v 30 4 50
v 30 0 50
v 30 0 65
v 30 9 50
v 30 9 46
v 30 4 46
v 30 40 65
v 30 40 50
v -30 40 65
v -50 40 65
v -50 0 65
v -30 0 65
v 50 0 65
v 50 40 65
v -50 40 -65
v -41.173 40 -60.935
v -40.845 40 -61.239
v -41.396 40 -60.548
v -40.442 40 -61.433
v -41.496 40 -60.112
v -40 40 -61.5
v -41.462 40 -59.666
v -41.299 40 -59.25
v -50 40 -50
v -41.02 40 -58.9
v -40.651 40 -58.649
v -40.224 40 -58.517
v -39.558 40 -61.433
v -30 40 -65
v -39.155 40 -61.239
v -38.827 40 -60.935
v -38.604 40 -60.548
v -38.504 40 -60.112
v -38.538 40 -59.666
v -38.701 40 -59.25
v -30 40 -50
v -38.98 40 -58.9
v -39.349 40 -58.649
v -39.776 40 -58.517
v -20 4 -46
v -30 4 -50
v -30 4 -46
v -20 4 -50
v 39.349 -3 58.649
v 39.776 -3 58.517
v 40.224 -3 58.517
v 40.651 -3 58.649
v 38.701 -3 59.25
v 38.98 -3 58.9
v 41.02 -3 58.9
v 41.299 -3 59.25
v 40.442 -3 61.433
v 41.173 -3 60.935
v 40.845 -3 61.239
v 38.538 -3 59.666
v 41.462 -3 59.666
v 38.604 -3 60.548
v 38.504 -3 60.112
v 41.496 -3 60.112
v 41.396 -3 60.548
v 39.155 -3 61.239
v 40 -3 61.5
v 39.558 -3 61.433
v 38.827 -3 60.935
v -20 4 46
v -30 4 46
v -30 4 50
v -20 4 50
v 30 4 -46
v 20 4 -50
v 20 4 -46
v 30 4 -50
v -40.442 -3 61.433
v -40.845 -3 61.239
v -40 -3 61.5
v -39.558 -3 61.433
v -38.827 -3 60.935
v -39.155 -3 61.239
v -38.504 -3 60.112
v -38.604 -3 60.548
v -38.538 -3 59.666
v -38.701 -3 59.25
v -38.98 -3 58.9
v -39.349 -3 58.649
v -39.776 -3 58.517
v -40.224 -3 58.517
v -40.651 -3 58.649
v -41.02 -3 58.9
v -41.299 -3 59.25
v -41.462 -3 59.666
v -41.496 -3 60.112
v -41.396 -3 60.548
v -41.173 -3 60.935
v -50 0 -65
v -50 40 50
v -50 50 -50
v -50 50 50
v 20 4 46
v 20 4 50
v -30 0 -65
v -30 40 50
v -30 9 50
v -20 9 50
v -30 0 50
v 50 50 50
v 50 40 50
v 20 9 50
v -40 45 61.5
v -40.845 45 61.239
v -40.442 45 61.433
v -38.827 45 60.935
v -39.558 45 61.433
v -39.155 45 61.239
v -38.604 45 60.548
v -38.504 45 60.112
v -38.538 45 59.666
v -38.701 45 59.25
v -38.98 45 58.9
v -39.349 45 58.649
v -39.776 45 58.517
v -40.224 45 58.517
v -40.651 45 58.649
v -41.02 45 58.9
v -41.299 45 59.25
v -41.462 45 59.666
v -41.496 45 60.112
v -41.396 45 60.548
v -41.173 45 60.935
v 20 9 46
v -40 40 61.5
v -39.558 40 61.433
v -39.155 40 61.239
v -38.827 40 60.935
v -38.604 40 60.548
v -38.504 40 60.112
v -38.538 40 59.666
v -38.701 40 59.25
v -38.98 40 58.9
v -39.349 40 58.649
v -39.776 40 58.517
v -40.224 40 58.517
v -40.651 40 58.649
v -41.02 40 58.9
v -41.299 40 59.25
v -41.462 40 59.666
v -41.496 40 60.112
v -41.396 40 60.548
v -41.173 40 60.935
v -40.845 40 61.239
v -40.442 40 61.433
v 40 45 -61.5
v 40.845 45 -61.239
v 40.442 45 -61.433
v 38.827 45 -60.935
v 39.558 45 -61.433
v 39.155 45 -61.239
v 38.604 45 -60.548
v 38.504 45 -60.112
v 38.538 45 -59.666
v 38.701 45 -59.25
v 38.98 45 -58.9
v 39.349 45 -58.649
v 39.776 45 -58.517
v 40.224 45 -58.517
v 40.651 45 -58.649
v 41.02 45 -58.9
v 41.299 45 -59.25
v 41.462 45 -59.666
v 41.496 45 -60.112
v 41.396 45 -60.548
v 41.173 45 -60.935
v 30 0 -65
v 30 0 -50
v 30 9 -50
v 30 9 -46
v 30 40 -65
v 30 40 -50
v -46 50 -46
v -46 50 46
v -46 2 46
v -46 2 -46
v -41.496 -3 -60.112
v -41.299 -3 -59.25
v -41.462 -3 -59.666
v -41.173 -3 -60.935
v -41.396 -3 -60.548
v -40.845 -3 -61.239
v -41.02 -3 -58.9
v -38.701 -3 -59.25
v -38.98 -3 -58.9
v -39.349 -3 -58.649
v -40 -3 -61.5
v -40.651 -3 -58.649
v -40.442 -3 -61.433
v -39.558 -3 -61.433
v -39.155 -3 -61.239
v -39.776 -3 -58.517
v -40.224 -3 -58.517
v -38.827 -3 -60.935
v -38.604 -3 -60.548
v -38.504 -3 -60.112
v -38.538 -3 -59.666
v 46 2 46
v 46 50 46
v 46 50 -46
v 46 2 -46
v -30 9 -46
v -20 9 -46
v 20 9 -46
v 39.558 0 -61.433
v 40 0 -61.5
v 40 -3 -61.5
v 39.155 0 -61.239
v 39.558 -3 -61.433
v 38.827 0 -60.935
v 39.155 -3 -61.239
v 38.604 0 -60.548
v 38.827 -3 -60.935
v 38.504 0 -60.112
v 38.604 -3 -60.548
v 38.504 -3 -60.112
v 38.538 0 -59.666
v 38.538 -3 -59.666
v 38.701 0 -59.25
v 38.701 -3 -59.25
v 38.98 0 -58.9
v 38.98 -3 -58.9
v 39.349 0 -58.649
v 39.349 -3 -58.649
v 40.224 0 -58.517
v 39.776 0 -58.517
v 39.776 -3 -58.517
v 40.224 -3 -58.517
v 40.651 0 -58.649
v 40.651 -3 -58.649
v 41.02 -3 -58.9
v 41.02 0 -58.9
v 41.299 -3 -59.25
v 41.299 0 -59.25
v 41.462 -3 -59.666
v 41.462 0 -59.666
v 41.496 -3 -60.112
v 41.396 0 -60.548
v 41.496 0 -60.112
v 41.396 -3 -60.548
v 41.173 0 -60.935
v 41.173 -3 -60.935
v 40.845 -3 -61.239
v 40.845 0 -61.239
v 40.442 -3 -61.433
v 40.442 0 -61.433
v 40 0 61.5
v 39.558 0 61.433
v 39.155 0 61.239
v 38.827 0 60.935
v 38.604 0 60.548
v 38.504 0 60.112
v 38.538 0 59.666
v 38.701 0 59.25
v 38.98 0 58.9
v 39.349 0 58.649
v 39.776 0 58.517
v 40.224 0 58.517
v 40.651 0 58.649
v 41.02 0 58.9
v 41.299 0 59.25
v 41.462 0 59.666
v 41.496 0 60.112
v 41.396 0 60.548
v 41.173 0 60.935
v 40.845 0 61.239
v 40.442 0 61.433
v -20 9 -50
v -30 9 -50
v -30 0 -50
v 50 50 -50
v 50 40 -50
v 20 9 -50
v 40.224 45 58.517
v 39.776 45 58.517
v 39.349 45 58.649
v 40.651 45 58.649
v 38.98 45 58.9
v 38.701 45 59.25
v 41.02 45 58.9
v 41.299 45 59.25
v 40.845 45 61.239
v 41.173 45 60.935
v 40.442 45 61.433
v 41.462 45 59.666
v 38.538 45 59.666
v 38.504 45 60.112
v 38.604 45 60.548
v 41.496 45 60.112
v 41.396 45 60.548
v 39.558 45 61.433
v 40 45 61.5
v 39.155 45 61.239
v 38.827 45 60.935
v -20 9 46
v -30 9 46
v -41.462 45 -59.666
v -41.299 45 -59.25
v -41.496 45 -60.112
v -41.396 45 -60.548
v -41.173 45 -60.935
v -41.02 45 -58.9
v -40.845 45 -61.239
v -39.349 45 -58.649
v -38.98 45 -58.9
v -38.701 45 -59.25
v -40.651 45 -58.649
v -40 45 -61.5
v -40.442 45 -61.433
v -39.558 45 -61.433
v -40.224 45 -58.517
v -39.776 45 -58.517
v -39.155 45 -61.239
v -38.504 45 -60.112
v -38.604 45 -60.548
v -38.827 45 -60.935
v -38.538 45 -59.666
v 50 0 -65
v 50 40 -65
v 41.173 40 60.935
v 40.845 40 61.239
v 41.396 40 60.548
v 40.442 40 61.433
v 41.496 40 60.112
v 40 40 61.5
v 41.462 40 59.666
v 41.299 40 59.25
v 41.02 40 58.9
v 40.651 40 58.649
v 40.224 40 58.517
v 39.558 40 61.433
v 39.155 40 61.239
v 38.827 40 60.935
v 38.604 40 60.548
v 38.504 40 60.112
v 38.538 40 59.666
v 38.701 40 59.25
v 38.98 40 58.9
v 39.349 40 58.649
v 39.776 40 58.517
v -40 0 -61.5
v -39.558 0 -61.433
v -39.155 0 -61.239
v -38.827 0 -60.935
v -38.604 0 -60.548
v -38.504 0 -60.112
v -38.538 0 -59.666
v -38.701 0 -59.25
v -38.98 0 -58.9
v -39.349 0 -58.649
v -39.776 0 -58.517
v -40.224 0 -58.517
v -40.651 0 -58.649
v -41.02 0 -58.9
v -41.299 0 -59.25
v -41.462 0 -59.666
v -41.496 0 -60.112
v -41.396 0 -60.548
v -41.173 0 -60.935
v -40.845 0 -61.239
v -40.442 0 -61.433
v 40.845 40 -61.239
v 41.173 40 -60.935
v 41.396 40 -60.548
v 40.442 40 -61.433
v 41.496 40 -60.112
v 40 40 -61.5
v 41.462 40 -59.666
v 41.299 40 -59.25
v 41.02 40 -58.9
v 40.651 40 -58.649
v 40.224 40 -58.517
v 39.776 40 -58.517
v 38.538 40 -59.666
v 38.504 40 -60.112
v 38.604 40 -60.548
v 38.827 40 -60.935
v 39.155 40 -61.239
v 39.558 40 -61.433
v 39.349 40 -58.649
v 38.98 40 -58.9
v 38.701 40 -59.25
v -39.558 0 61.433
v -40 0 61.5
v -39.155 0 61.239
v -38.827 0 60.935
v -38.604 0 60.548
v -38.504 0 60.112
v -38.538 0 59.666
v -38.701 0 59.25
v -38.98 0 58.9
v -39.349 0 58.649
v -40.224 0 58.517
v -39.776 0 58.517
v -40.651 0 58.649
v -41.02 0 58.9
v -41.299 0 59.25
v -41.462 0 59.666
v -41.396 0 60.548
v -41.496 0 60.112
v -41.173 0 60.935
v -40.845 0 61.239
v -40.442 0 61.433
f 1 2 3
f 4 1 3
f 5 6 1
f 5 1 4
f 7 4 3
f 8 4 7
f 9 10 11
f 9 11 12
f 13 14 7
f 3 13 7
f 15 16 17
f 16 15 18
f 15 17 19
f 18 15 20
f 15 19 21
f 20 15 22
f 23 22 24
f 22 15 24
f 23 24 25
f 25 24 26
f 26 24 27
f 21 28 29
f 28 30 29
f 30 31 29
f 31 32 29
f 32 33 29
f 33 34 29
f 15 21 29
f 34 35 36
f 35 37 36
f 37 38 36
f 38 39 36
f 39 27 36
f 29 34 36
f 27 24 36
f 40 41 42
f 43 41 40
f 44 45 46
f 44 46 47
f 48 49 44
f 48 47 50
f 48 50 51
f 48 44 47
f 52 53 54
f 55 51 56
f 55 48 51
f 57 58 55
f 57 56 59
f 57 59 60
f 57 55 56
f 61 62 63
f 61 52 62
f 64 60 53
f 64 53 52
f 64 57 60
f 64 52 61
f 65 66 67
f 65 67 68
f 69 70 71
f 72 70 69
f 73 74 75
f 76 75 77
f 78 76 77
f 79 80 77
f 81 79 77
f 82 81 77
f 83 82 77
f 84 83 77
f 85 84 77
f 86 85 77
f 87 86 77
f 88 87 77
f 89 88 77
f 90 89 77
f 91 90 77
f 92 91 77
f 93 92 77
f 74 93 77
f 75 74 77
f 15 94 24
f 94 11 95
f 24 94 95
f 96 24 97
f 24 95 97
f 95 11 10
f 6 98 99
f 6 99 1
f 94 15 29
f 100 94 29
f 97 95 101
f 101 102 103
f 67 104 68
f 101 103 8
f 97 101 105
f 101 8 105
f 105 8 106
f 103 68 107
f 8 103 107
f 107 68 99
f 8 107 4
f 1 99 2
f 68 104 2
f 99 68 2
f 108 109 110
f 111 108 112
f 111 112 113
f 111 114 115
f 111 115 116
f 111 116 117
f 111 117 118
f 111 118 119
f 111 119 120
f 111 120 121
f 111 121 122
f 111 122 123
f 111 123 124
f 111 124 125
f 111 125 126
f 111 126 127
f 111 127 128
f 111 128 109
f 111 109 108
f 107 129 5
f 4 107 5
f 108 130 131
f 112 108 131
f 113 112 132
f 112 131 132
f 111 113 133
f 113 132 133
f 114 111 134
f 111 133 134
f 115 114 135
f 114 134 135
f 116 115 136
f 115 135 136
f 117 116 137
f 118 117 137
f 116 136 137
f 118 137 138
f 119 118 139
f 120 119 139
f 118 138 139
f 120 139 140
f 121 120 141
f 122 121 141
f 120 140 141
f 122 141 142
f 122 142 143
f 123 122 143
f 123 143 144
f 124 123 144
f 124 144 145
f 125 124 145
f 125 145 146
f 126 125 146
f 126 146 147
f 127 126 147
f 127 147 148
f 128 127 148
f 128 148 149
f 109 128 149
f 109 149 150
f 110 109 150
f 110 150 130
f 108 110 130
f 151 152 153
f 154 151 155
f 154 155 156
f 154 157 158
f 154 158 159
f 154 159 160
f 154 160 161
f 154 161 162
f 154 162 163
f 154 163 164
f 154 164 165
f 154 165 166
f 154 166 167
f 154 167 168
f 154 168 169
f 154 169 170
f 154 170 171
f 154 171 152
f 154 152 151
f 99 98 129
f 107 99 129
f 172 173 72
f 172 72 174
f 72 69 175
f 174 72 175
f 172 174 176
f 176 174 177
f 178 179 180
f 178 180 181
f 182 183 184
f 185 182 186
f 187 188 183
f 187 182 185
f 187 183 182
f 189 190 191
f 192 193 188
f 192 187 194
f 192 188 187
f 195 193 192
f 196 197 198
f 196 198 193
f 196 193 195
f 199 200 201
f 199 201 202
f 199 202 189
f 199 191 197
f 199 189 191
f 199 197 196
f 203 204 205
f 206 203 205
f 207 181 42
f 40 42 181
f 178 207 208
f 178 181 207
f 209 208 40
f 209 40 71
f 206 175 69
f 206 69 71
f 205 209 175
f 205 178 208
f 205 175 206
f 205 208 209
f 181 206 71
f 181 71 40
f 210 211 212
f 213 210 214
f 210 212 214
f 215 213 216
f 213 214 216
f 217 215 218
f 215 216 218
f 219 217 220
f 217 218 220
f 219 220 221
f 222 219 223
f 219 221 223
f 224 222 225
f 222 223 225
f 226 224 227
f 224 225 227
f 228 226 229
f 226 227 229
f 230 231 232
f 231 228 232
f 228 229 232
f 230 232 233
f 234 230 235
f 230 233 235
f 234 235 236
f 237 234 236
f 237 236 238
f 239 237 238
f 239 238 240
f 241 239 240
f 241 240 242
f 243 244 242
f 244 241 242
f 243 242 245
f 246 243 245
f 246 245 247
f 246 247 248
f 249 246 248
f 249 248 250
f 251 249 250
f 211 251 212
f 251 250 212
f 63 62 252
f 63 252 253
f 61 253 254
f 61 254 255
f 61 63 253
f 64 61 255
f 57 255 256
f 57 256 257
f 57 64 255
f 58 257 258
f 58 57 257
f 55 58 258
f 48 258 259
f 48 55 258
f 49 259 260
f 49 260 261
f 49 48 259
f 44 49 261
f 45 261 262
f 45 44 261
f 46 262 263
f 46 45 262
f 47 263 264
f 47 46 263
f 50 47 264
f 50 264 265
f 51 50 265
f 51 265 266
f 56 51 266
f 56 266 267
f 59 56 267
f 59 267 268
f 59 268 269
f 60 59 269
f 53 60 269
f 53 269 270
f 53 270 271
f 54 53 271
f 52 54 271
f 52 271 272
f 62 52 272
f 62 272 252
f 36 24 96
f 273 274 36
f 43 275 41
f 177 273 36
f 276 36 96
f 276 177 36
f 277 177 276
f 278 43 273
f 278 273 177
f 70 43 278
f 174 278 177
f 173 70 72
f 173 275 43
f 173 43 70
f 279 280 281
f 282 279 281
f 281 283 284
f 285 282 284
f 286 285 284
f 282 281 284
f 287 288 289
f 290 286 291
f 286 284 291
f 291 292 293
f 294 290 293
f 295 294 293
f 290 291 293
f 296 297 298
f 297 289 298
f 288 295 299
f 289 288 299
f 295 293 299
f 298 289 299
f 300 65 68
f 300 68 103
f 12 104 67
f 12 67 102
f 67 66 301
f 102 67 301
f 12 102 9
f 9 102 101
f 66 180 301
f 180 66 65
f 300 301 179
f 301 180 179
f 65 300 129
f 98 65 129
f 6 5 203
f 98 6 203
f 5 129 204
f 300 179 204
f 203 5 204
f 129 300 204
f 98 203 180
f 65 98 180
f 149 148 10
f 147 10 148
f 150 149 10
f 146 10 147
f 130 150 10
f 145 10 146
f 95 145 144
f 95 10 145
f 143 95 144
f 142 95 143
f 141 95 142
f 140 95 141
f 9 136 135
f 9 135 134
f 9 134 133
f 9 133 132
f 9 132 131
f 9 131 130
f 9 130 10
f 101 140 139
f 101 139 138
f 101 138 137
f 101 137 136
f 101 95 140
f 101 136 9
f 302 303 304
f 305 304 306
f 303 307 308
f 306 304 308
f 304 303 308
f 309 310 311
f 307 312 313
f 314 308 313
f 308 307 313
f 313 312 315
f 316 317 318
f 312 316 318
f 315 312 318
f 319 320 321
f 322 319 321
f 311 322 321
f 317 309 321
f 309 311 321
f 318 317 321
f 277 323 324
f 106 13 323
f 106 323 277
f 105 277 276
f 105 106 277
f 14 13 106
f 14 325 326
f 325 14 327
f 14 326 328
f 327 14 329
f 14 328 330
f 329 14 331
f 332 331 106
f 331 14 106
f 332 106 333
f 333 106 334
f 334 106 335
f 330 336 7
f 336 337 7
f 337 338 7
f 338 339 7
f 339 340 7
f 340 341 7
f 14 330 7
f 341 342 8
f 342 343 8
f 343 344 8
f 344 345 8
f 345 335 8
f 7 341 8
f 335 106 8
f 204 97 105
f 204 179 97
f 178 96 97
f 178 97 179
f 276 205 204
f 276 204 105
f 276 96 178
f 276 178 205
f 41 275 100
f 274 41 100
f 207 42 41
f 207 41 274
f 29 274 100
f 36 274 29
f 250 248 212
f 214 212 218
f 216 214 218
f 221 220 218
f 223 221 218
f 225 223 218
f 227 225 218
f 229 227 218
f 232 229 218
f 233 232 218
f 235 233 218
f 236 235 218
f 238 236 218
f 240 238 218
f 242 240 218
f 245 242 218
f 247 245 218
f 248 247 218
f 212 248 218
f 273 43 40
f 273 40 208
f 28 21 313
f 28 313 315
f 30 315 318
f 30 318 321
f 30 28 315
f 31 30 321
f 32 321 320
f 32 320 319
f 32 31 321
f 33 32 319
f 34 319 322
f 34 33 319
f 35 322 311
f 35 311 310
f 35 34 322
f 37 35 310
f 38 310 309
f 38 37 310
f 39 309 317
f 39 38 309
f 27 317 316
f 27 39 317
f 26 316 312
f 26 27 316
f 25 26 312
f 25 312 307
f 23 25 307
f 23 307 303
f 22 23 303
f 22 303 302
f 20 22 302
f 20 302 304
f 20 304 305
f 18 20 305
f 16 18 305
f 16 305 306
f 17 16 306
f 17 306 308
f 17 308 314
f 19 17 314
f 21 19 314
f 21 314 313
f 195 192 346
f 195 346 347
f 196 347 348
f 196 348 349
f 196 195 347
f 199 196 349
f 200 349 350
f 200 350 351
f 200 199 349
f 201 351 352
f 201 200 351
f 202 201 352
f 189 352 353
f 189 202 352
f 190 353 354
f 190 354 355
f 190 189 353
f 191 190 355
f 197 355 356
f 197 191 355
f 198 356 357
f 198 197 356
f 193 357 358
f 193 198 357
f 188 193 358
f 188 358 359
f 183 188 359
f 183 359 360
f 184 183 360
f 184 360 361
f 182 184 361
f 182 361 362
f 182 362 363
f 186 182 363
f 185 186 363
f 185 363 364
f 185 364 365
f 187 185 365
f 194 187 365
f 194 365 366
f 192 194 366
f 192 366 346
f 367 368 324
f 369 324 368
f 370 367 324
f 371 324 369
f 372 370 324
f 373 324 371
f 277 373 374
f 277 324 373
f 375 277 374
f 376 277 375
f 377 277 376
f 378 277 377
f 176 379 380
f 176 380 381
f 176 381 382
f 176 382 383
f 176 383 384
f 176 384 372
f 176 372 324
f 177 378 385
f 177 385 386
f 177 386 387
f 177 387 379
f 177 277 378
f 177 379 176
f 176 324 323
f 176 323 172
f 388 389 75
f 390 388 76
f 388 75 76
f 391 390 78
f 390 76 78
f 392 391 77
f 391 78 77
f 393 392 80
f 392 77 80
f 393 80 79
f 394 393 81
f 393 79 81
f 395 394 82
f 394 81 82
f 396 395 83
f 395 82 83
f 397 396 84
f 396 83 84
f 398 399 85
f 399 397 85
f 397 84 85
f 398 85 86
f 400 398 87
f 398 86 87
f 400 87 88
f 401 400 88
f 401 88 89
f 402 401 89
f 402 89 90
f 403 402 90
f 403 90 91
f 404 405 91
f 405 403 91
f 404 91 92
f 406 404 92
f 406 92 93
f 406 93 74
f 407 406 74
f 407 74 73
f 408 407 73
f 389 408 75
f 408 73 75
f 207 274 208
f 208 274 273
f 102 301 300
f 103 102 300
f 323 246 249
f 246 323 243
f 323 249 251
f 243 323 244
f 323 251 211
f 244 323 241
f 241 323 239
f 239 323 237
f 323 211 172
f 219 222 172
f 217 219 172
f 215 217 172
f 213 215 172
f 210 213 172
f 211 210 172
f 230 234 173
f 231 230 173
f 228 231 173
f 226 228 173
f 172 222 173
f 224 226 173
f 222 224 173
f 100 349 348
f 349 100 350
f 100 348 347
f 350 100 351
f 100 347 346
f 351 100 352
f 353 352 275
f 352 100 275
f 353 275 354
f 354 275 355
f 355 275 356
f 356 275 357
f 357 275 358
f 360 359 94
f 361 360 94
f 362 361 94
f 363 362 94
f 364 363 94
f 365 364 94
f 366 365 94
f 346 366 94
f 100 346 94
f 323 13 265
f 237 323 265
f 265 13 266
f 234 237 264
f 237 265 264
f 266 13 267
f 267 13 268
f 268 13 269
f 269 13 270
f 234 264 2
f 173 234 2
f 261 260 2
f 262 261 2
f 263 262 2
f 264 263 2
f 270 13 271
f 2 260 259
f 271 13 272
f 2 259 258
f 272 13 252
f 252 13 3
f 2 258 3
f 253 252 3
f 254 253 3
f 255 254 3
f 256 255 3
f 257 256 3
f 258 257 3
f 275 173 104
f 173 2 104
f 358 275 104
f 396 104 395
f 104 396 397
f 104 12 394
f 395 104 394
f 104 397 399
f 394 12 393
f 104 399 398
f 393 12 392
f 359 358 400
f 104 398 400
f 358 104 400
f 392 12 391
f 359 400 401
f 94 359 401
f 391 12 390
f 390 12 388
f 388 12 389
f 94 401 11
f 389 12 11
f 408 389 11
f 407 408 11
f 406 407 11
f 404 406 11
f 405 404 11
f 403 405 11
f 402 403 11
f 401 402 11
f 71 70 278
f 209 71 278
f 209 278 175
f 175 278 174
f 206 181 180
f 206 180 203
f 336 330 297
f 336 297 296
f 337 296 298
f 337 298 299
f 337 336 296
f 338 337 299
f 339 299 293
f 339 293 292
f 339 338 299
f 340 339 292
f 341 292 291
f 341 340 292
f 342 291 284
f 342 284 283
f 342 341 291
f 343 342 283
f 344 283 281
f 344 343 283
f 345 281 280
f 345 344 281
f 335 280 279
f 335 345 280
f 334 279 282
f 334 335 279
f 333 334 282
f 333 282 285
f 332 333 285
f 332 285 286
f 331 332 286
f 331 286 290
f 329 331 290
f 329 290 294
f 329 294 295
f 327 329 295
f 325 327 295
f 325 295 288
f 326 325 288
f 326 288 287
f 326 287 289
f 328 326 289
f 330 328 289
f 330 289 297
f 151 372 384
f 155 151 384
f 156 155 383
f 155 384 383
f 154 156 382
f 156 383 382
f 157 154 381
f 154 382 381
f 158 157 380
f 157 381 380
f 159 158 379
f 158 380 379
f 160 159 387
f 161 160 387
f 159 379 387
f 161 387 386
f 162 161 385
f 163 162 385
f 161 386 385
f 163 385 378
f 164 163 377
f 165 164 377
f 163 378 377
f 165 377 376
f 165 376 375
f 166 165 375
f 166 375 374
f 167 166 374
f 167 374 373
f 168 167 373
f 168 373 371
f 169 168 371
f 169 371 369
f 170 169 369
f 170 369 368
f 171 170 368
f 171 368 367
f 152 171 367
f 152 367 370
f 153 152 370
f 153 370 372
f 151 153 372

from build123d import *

# Parameters (mm, degrees)
SKETCH1_W               = 100
SKETCH1_H               = 100
BOSS_EXTRUDE1_DEPTH     = 50
SKETCH2_W               = 92
SKETCH2_H               = 92
CUT_EXTRUDE1_DEPTH      = 48
CUT_EXTRUDE2_DEPTH      = 123.474487139
CUT_EXTRUDE2_DEPTH_BACK = 123.474487139
SKETCH6_W               = 10
SKETCH6_H               = 5
SKETCH3_W               = 20
SKETCH3_H               = 40
BOSS_EXTRUDE2_DEPTH     = 15
BOSS_EXTRUDE3_START     = -43
SKETCH5_R               = 1.5
BOSS_EXTRUDE3_DEPTH     = 48
MIRROR2_COPY_1_SKETCH_W = 20
MIRROR2_COPY_1_SKETCH_H = 40
MIRROR2_COPY_1_DEPTH    = 15
MIRROR2_START           = -43
MIRROR2_COPY_2_SKETCH_R = 1.5
MIRROR2_COPY_2_DEPTH    = 48


with BuildPart() as part:
    # Sketch1 → Boss-Extrude1 (new body)
    with BuildSketch(Plane(origin=(0, 0, 0), x_dir=(1, 0, 0), z_dir=(0, 1, 0))):
        Rectangle(SKETCH1_W, SKETCH1_H)
    extrude(amount=BOSS_EXTRUDE1_DEPTH)

    # Sketch2 → Cut-Extrude1 (cut)
    with BuildSketch(Plane(origin=(0, 50, 0), x_dir=(1, 0, 0), z_dir=(0, 1, 0))):
        Rectangle(SKETCH2_W, SKETCH2_H)
    extrude(amount=-CUT_EXTRUDE1_DEPTH, mode=Mode.SUBTRACT)

    # Sketch6 → Cut-Extrude2 (cut, two sides: drawn at the far end of the back side and taken through both)
    with BuildSketch(Plane.XY.offset(50).offset(-CUT_EXTRUDE2_DEPTH_BACK)):
        with Locations((-25, 6.5)):
            Rectangle(SKETCH6_W, SKETCH6_H)
        with Locations((25, 6.5)):
            Rectangle(SKETCH6_W, SKETCH6_H)
    extrude(amount=CUT_EXTRUDE2_DEPTH + CUT_EXTRUDE2_DEPTH_BACK, mode=Mode.SUBTRACT)

    # Sketch3 → Boss-Extrude2 (add)
    with BuildSketch(Plane.XY.offset(50)):
        with Locations((-40, 20)):
            Rectangle(SKETCH3_W, SKETCH3_H)
    boss_extrude2 = extrude(amount=BOSS_EXTRUDE2_DEPTH)

    # Sketch5 → Boss-Extrude3 (add)
    with BuildSketch(Plane(origin=(0, 40, 0), x_dir=(1, 0, 0), z_dir=(0, 1, 0)).offset(BOSS_EXTRUDE3_START)):
        with Locations(Location((-40, -60, 0), (0, 0, 270))):
            Circle(SKETCH5_R)
    boss_extrude3 = extrude(amount=BOSS_EXTRUDE3_DEPTH)

    # Mirror1: Boss-Extrude2, Boss-Extrude3 across plane
    add(boss_extrude2.mirror(Plane.ZY))
    add(boss_extrude3.mirror(Plane.ZY))

    # Mirror2: Boss-Extrude2, Boss-Extrude3 across plane
    add(boss_extrude2.mirror(Plane(origin=(0, 0, 0), x_dir=(1, 0, 0), z_dir=(0, 0, -1))))
    add(boss_extrude3.mirror(Plane(origin=(0, 0, 0), x_dir=(1, 0, 0), z_dir=(0, 0, -1))))

    # Mirror2 copy 1 sketch → Mirror2 copy 1 (add)
    with BuildSketch(Plane(origin=(0, 0, -50), x_dir=(-1, 0, 0), z_dir=(0, 0, -1))):
        with Locations((-40, 20)):
            Rectangle(MIRROR2_COPY_1_SKETCH_W, MIRROR2_COPY_1_SKETCH_H)
    extrude(amount=MIRROR2_COPY_1_DEPTH)

    # Mirror2 copy 2 sketch → Mirror2 copy 2 (add)
    with BuildSketch(Plane(origin=(0, 40, 0), x_dir=(-1, 0, 0), z_dir=(0, 1, 0)).offset(MIRROR2_START)):
        with Locations(Location((-40, -60, 0), (0, 0, 270))):
            Circle(MIRROR2_COPY_2_SKETCH_R)
    extrude(amount=MIRROR2_COPY_2_DEPTH)


solid = part.part
